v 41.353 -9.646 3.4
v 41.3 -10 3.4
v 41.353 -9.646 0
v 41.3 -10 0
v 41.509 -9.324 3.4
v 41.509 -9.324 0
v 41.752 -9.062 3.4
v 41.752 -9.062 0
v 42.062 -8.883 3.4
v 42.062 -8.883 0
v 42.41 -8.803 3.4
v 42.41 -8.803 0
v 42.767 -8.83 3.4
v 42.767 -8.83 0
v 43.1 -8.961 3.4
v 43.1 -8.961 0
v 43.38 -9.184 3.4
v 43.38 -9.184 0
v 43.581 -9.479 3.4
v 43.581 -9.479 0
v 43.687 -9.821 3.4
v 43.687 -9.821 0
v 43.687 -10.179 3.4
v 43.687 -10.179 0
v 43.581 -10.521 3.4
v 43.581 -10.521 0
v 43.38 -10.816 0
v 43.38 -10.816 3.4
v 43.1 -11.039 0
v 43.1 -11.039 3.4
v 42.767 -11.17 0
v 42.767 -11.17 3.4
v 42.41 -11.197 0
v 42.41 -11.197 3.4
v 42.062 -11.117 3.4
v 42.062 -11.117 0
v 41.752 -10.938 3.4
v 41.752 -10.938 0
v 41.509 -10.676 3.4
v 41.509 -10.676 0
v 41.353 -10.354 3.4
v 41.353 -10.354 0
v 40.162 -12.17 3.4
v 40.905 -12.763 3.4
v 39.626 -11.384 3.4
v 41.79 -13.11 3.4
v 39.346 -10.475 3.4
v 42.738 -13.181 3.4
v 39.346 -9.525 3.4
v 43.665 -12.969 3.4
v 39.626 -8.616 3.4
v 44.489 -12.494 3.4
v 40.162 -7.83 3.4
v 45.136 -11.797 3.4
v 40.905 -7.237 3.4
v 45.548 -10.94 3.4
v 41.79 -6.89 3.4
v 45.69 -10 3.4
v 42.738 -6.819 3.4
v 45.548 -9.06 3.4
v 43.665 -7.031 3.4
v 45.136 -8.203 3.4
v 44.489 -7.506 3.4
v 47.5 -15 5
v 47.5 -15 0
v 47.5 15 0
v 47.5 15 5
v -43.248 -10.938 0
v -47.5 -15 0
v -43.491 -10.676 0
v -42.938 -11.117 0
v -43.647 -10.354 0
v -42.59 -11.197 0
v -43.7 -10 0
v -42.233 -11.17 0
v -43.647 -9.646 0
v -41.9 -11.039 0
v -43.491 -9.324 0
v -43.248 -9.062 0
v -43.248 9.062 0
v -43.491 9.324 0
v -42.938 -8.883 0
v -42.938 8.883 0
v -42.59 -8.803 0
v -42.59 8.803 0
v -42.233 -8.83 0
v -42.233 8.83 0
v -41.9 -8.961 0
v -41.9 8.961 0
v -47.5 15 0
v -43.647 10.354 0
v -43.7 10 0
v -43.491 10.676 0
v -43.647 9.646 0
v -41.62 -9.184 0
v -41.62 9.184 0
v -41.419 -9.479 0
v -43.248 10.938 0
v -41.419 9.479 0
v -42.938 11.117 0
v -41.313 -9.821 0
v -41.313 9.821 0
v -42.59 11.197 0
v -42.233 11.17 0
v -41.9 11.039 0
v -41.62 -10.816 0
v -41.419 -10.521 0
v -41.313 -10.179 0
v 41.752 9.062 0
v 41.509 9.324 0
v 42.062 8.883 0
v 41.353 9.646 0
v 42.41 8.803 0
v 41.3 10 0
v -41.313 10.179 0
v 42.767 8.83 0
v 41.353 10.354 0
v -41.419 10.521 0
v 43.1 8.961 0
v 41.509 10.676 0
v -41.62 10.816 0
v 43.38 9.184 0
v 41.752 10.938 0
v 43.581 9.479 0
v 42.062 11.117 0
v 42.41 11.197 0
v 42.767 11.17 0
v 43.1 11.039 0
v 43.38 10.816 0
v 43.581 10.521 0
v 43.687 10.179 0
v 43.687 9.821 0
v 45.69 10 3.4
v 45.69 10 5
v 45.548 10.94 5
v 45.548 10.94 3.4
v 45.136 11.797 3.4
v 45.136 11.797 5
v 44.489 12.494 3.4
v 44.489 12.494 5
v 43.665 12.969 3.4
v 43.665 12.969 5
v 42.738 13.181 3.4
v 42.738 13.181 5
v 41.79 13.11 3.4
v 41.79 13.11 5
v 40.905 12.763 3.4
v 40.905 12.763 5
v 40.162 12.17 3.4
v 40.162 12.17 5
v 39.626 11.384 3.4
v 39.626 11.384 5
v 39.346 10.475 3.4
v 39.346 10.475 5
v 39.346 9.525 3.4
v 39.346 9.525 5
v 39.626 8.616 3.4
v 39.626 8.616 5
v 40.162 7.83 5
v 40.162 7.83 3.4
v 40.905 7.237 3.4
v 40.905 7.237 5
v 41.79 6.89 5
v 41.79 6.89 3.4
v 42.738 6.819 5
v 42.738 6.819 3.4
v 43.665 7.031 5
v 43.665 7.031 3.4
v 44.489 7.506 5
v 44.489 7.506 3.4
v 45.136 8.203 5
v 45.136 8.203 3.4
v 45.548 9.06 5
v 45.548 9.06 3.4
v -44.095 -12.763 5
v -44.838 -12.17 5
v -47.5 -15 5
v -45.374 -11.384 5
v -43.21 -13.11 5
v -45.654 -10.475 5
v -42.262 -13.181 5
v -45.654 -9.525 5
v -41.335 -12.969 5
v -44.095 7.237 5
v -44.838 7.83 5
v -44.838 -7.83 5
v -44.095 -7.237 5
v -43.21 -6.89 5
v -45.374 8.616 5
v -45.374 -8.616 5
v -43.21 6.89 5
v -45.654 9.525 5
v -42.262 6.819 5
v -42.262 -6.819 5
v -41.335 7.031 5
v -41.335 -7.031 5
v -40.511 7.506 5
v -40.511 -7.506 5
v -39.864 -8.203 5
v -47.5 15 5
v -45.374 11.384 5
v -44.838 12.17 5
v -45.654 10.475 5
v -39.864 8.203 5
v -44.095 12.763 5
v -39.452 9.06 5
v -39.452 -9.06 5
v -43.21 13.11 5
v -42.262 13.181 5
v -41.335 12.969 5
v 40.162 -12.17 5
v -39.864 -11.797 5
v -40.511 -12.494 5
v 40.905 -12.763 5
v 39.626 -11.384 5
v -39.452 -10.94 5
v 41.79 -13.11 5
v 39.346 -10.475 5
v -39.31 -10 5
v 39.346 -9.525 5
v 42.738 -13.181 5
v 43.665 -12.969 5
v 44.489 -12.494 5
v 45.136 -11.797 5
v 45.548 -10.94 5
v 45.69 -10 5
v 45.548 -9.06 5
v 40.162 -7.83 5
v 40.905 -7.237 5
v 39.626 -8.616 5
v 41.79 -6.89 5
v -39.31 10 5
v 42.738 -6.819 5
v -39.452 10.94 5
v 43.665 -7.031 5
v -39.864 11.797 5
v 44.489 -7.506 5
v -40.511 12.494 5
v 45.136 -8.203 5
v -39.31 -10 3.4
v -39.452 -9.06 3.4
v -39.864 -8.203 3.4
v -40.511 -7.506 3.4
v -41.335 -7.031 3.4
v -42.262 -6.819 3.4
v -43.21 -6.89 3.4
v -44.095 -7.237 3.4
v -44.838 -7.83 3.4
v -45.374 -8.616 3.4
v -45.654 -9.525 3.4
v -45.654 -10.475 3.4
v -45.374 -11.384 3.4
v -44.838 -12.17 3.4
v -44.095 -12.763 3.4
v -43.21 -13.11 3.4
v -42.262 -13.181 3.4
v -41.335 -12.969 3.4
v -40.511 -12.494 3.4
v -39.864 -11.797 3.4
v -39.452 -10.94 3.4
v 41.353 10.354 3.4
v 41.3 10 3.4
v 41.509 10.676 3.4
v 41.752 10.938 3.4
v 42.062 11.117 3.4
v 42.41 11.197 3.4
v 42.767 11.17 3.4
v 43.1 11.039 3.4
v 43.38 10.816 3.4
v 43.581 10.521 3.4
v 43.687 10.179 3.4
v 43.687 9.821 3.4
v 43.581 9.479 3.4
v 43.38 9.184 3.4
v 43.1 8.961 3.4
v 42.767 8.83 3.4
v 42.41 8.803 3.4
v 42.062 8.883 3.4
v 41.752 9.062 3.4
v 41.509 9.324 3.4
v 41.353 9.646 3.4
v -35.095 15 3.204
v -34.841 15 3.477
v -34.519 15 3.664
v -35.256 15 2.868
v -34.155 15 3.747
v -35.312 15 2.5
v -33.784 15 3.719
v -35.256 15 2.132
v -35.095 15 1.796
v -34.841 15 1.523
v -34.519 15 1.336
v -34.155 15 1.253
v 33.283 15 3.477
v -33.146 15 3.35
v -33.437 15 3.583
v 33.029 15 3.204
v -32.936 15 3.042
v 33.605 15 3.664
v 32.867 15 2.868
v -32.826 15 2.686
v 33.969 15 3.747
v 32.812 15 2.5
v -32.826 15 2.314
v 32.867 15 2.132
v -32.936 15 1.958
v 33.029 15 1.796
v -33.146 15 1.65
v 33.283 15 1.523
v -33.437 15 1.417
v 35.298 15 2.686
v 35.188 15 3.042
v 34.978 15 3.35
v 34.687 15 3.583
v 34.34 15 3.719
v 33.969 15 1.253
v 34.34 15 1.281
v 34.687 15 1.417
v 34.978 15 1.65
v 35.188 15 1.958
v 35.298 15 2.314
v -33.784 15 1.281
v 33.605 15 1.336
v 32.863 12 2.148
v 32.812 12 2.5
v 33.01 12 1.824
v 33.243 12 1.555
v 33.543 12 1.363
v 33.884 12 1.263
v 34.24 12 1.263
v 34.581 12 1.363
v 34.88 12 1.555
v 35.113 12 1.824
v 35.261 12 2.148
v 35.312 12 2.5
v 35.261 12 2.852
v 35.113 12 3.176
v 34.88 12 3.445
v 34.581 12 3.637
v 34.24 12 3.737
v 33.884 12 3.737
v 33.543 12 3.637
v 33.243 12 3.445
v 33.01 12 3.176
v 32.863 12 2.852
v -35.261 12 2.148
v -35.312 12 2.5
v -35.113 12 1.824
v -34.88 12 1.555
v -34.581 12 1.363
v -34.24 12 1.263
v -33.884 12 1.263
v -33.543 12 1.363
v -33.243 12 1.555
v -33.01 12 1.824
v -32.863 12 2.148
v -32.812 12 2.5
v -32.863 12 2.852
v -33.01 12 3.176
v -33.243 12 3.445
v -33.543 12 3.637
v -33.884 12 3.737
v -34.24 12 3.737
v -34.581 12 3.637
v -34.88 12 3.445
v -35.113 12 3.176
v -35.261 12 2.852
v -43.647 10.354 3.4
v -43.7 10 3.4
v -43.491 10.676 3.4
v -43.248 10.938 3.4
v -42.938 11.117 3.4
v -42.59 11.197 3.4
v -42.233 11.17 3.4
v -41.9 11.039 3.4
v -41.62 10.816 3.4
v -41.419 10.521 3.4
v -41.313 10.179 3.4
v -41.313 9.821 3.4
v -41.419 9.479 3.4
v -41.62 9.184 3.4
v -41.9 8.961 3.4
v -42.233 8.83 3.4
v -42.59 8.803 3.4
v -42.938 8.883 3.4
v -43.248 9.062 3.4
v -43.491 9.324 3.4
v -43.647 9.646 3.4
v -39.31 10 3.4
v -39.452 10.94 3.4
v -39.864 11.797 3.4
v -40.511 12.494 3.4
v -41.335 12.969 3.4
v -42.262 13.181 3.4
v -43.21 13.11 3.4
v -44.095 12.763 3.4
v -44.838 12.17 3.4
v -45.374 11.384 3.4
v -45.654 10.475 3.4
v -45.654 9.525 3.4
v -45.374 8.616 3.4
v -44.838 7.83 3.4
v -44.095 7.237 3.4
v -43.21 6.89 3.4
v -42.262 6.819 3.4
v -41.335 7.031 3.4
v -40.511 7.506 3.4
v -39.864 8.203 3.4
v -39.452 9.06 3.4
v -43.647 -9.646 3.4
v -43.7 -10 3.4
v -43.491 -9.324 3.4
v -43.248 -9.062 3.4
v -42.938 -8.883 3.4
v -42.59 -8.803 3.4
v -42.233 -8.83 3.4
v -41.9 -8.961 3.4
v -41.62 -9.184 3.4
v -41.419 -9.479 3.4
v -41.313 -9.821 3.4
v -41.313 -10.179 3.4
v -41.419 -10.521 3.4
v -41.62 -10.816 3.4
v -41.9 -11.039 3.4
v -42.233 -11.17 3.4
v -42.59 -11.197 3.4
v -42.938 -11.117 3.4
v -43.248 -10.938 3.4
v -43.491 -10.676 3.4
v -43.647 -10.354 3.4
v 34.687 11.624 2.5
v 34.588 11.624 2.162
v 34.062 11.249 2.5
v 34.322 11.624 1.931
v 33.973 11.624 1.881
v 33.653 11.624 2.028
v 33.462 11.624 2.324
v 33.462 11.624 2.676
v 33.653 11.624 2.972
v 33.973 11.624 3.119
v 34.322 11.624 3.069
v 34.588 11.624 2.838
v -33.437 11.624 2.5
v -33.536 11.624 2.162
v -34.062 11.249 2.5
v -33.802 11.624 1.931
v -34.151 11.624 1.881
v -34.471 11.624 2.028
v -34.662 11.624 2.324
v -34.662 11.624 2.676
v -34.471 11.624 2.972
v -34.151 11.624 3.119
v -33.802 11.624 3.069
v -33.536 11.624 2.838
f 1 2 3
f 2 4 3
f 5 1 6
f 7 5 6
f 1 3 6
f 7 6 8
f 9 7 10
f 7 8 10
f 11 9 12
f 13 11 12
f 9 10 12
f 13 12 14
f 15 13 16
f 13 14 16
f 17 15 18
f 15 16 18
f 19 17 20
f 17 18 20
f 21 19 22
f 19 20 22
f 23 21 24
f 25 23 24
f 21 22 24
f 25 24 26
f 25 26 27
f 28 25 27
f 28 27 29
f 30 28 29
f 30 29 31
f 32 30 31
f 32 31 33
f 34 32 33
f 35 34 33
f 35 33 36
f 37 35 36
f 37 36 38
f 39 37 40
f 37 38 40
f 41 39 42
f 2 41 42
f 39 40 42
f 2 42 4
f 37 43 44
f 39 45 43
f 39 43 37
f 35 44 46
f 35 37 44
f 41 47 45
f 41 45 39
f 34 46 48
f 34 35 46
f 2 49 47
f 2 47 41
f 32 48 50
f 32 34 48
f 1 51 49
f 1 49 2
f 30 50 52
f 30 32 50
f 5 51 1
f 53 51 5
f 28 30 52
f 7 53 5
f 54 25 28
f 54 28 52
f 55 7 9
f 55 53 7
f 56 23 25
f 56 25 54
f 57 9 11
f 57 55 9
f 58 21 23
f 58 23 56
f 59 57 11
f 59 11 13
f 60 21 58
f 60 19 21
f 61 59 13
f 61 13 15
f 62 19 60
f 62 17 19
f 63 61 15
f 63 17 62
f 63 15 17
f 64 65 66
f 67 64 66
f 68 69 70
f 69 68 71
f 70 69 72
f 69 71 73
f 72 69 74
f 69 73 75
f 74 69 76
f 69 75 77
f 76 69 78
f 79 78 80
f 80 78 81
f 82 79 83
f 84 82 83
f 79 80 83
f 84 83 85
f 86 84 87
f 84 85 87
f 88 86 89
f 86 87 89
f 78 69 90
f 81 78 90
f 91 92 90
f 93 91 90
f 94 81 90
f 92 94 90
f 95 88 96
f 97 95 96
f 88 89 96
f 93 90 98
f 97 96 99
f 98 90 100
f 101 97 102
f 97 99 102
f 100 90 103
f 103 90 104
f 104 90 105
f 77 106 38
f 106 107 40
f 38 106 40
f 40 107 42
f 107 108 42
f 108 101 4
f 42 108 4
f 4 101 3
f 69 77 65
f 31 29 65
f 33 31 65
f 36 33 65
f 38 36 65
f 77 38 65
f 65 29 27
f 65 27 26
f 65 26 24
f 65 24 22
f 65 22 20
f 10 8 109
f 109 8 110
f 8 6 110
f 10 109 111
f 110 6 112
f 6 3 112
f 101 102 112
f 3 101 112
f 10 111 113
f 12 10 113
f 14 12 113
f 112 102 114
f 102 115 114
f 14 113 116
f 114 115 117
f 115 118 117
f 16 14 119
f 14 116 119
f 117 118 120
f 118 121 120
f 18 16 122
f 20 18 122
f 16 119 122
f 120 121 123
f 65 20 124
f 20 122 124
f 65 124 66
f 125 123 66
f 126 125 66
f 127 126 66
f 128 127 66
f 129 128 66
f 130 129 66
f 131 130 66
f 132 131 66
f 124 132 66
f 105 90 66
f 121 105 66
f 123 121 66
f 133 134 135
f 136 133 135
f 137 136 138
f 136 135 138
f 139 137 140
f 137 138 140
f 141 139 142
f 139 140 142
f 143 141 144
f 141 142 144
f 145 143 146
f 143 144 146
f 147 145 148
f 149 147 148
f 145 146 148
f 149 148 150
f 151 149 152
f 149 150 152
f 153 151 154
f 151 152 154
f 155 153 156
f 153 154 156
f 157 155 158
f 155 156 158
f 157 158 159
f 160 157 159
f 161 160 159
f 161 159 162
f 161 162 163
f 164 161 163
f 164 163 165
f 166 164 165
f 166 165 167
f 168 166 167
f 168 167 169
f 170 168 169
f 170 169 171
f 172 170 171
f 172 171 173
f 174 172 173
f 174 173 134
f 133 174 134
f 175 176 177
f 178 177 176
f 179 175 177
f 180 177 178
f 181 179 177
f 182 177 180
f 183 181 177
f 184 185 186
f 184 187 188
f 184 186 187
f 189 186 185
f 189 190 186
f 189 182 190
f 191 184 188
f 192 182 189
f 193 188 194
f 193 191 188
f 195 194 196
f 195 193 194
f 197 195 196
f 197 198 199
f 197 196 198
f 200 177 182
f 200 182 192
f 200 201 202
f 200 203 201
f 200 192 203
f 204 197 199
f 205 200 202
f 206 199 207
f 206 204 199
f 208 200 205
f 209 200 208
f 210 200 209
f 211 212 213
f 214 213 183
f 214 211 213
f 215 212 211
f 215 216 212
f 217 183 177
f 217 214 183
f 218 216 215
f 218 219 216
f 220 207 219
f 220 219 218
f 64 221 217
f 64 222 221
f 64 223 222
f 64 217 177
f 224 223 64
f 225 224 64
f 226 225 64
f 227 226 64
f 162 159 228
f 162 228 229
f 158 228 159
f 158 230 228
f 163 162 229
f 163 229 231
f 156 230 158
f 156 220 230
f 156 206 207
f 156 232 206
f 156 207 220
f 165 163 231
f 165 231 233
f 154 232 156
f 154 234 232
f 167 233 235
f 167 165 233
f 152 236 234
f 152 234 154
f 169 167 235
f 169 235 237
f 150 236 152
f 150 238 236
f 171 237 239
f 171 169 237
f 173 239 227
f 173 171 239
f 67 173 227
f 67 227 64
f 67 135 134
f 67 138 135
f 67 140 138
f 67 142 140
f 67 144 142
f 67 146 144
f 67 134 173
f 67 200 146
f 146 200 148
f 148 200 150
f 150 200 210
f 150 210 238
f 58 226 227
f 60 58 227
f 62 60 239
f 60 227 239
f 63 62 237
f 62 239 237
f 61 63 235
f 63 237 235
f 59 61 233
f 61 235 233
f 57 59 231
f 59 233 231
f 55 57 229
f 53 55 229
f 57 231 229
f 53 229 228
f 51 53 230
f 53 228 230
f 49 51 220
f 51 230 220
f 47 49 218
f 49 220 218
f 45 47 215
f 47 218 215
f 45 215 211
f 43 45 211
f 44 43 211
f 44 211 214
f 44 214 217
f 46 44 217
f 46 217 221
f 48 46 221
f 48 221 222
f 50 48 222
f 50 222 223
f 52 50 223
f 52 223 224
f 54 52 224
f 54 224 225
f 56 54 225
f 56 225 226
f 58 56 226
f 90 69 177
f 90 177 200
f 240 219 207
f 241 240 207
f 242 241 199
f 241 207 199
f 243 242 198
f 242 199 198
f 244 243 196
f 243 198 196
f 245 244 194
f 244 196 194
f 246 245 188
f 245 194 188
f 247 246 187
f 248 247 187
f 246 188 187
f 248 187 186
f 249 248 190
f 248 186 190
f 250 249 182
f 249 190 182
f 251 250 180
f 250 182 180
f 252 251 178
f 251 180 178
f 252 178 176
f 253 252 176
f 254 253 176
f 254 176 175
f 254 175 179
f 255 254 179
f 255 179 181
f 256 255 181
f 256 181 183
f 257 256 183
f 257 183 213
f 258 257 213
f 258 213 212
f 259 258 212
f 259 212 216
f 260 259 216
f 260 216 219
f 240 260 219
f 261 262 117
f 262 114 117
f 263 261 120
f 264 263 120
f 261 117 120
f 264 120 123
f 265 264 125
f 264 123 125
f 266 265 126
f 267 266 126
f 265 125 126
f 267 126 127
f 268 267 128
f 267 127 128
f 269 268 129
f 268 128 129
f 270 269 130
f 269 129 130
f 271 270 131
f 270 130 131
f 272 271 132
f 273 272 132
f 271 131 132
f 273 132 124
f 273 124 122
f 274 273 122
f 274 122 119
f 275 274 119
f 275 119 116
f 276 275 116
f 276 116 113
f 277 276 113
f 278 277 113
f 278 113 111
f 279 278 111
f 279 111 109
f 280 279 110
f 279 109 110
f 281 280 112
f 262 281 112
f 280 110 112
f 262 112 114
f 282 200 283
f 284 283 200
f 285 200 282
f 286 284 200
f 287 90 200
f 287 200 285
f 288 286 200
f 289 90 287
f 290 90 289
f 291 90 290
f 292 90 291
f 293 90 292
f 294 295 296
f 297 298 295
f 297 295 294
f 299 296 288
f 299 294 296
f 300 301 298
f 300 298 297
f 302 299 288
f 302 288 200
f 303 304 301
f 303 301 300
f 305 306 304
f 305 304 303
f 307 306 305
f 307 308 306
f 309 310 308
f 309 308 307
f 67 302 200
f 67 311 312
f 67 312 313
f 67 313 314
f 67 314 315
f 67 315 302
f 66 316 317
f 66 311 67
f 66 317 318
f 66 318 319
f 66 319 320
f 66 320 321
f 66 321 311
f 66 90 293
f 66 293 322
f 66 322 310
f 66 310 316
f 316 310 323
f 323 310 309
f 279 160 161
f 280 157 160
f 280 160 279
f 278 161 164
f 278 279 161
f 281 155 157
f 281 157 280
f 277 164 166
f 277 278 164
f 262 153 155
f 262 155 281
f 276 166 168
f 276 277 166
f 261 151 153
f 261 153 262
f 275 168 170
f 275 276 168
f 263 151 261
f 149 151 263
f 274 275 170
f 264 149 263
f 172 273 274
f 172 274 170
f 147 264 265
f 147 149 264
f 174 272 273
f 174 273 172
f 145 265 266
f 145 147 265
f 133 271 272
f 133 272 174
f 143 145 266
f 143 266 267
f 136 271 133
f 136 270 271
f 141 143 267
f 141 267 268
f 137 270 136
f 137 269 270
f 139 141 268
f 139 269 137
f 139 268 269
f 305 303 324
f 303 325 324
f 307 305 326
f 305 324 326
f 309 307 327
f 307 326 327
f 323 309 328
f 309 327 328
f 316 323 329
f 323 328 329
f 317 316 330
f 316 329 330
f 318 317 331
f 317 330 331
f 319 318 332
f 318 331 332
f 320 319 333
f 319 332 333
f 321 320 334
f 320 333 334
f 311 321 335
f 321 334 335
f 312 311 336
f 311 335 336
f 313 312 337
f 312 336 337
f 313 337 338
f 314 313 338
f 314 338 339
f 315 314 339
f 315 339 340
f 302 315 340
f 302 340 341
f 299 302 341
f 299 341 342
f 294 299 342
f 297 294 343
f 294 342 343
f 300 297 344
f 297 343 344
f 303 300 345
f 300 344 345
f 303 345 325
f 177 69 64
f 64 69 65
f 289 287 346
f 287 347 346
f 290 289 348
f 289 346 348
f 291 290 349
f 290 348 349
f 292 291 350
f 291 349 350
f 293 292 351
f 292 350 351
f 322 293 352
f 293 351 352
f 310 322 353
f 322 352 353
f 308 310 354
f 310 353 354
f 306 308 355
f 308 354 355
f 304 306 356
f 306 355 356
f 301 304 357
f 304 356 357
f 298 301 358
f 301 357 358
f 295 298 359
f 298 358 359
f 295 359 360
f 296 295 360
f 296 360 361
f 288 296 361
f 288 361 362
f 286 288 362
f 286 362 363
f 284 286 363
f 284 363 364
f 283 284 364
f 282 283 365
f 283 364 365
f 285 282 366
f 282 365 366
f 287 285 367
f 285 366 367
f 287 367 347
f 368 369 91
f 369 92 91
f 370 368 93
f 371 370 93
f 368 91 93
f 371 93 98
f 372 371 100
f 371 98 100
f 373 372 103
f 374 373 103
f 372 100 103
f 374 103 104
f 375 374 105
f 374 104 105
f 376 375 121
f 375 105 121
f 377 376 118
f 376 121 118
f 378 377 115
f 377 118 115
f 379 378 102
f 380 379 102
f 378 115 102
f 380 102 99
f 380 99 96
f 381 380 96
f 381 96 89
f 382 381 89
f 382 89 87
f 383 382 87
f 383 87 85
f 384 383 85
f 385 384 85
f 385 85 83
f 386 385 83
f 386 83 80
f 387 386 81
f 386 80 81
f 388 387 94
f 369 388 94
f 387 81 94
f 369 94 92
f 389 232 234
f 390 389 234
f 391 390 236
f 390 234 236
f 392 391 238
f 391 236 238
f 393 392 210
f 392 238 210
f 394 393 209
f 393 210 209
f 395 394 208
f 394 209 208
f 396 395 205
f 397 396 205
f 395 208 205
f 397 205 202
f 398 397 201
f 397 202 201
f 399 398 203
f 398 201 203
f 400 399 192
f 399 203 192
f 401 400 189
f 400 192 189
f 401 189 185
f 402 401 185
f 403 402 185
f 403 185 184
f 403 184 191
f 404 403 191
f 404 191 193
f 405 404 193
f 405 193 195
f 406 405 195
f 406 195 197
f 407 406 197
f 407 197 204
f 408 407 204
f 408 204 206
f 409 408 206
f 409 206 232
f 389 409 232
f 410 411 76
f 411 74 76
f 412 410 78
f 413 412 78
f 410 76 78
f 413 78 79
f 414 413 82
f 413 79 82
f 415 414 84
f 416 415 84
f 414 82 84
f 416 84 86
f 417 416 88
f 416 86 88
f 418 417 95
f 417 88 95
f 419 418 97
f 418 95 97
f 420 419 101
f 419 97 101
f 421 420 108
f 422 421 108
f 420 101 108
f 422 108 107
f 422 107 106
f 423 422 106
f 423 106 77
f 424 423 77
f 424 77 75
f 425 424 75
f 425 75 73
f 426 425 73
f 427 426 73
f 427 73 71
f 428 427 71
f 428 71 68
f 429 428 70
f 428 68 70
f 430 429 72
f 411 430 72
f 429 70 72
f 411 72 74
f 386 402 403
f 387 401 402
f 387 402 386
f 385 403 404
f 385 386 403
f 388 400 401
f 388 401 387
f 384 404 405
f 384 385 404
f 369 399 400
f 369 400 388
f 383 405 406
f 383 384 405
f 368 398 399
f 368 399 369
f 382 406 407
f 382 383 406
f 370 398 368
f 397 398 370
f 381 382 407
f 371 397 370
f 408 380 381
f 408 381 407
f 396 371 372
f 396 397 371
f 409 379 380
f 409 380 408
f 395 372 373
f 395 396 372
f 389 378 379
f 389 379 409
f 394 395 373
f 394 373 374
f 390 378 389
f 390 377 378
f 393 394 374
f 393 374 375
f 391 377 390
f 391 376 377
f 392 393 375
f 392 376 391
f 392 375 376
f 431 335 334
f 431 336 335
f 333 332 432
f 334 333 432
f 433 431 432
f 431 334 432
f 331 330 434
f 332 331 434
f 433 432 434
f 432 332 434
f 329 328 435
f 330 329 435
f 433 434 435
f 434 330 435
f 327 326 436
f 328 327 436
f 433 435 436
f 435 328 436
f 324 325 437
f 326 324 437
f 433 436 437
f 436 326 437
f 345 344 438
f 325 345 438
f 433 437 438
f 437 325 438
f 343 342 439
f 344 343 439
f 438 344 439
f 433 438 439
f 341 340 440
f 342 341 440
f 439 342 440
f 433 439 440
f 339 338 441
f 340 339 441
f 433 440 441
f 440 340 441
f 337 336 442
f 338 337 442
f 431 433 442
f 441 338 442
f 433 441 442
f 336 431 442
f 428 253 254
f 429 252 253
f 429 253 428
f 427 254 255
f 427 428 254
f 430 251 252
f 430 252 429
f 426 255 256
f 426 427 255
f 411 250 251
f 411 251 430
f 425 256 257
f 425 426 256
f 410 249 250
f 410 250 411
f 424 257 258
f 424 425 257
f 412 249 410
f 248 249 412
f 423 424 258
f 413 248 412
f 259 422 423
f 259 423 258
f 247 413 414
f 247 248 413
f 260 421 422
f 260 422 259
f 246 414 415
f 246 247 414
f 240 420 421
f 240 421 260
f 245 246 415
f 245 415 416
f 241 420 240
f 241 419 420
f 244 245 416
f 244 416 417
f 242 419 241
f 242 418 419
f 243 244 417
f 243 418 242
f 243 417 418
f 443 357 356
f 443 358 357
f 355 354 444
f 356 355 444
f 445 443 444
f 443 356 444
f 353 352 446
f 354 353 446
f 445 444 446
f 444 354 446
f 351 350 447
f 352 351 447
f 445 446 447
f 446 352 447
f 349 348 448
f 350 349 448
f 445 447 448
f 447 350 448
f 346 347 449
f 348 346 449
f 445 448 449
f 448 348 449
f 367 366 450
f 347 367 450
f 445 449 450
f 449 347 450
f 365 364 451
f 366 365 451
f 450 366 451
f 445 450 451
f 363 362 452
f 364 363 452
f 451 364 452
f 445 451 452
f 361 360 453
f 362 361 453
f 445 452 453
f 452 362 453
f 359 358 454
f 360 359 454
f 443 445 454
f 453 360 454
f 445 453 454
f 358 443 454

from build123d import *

# Parameters (mm, degrees)
SKETCH1_W                                        = 95
SKETCH1_H                                        = 30
BOSS_EXTRUDE1_DEPTH                              = 5
CBORE_FOR_M2_HEX_HEAD_MACHINE_SCREW1_D           = 2.4
CBORE_FOR_M2_HEX_HEAD_MACHINE_SCREW1_CBORE_D     = 6.38
CBORE_FOR_M2_HEX_HEAD_MACHINE_SCREW1_CBORE_DEPTH = 1.6
M3X0_5_TAPPED_HOLE1_D                            = 2.5
M3X0_5_TAPPED_HOLE1_DEPTH                        = 3
M3X0_5_TAPPED_HOLE1_TIP                          = 0.751075774


with BuildPart() as part:
    # Sketch1 → Boss-Extrude1 (new body)
    with BuildSketch(Plane.XY):
        Rectangle(SKETCH1_W, SKETCH1_H)
    extrude(amount=BOSS_EXTRUDE1_DEPTH)

    # CBORE for M2 Hex Head Machine Screw1 (through all)
    with Locations(Plane.XY.offset(5)):
        with Locations((-42.5, 10), (-42.5, -10), (42.5, -10), (42.5, 10)):
            CounterBoreHole(CBORE_FOR_M2_HEX_HEAD_MACHINE_SCREW1_D / 2, CBORE_FOR_M2_HEX_HEAD_MACHINE_SCREW1_CBORE_D / 2, CBORE_FOR_M2_HEX_HEAD_MACHINE_SCREW1_CBORE_DEPTH)

    # M3x0.5 Tapped Hole1
    with Locations(Plane(origin=(0, 15, 0), x_dir=(1, 0, 0), z_dir=(0, 1, 0))):
        with Locations((34.061922087, -2.5), (-34.061922087, -2.5)):
            Hole(M3X0_5_TAPPED_HOLE1_D / 2, depth=M3X0_5_TAPPED_HOLE1_DEPTH)
            with Locations((0, 0, -(M3X0_5_TAPPED_HOLE1_DEPTH + M3X0_5_TAPPED_HOLE1_TIP / 2))):  # 118° drill point
                Cone(0, M3X0_5_TAPPED_HOLE1_D / 2, M3X0_5_TAPPED_HOLE1_TIP, mode=Mode.SUBTRACT)


solid = part.part
